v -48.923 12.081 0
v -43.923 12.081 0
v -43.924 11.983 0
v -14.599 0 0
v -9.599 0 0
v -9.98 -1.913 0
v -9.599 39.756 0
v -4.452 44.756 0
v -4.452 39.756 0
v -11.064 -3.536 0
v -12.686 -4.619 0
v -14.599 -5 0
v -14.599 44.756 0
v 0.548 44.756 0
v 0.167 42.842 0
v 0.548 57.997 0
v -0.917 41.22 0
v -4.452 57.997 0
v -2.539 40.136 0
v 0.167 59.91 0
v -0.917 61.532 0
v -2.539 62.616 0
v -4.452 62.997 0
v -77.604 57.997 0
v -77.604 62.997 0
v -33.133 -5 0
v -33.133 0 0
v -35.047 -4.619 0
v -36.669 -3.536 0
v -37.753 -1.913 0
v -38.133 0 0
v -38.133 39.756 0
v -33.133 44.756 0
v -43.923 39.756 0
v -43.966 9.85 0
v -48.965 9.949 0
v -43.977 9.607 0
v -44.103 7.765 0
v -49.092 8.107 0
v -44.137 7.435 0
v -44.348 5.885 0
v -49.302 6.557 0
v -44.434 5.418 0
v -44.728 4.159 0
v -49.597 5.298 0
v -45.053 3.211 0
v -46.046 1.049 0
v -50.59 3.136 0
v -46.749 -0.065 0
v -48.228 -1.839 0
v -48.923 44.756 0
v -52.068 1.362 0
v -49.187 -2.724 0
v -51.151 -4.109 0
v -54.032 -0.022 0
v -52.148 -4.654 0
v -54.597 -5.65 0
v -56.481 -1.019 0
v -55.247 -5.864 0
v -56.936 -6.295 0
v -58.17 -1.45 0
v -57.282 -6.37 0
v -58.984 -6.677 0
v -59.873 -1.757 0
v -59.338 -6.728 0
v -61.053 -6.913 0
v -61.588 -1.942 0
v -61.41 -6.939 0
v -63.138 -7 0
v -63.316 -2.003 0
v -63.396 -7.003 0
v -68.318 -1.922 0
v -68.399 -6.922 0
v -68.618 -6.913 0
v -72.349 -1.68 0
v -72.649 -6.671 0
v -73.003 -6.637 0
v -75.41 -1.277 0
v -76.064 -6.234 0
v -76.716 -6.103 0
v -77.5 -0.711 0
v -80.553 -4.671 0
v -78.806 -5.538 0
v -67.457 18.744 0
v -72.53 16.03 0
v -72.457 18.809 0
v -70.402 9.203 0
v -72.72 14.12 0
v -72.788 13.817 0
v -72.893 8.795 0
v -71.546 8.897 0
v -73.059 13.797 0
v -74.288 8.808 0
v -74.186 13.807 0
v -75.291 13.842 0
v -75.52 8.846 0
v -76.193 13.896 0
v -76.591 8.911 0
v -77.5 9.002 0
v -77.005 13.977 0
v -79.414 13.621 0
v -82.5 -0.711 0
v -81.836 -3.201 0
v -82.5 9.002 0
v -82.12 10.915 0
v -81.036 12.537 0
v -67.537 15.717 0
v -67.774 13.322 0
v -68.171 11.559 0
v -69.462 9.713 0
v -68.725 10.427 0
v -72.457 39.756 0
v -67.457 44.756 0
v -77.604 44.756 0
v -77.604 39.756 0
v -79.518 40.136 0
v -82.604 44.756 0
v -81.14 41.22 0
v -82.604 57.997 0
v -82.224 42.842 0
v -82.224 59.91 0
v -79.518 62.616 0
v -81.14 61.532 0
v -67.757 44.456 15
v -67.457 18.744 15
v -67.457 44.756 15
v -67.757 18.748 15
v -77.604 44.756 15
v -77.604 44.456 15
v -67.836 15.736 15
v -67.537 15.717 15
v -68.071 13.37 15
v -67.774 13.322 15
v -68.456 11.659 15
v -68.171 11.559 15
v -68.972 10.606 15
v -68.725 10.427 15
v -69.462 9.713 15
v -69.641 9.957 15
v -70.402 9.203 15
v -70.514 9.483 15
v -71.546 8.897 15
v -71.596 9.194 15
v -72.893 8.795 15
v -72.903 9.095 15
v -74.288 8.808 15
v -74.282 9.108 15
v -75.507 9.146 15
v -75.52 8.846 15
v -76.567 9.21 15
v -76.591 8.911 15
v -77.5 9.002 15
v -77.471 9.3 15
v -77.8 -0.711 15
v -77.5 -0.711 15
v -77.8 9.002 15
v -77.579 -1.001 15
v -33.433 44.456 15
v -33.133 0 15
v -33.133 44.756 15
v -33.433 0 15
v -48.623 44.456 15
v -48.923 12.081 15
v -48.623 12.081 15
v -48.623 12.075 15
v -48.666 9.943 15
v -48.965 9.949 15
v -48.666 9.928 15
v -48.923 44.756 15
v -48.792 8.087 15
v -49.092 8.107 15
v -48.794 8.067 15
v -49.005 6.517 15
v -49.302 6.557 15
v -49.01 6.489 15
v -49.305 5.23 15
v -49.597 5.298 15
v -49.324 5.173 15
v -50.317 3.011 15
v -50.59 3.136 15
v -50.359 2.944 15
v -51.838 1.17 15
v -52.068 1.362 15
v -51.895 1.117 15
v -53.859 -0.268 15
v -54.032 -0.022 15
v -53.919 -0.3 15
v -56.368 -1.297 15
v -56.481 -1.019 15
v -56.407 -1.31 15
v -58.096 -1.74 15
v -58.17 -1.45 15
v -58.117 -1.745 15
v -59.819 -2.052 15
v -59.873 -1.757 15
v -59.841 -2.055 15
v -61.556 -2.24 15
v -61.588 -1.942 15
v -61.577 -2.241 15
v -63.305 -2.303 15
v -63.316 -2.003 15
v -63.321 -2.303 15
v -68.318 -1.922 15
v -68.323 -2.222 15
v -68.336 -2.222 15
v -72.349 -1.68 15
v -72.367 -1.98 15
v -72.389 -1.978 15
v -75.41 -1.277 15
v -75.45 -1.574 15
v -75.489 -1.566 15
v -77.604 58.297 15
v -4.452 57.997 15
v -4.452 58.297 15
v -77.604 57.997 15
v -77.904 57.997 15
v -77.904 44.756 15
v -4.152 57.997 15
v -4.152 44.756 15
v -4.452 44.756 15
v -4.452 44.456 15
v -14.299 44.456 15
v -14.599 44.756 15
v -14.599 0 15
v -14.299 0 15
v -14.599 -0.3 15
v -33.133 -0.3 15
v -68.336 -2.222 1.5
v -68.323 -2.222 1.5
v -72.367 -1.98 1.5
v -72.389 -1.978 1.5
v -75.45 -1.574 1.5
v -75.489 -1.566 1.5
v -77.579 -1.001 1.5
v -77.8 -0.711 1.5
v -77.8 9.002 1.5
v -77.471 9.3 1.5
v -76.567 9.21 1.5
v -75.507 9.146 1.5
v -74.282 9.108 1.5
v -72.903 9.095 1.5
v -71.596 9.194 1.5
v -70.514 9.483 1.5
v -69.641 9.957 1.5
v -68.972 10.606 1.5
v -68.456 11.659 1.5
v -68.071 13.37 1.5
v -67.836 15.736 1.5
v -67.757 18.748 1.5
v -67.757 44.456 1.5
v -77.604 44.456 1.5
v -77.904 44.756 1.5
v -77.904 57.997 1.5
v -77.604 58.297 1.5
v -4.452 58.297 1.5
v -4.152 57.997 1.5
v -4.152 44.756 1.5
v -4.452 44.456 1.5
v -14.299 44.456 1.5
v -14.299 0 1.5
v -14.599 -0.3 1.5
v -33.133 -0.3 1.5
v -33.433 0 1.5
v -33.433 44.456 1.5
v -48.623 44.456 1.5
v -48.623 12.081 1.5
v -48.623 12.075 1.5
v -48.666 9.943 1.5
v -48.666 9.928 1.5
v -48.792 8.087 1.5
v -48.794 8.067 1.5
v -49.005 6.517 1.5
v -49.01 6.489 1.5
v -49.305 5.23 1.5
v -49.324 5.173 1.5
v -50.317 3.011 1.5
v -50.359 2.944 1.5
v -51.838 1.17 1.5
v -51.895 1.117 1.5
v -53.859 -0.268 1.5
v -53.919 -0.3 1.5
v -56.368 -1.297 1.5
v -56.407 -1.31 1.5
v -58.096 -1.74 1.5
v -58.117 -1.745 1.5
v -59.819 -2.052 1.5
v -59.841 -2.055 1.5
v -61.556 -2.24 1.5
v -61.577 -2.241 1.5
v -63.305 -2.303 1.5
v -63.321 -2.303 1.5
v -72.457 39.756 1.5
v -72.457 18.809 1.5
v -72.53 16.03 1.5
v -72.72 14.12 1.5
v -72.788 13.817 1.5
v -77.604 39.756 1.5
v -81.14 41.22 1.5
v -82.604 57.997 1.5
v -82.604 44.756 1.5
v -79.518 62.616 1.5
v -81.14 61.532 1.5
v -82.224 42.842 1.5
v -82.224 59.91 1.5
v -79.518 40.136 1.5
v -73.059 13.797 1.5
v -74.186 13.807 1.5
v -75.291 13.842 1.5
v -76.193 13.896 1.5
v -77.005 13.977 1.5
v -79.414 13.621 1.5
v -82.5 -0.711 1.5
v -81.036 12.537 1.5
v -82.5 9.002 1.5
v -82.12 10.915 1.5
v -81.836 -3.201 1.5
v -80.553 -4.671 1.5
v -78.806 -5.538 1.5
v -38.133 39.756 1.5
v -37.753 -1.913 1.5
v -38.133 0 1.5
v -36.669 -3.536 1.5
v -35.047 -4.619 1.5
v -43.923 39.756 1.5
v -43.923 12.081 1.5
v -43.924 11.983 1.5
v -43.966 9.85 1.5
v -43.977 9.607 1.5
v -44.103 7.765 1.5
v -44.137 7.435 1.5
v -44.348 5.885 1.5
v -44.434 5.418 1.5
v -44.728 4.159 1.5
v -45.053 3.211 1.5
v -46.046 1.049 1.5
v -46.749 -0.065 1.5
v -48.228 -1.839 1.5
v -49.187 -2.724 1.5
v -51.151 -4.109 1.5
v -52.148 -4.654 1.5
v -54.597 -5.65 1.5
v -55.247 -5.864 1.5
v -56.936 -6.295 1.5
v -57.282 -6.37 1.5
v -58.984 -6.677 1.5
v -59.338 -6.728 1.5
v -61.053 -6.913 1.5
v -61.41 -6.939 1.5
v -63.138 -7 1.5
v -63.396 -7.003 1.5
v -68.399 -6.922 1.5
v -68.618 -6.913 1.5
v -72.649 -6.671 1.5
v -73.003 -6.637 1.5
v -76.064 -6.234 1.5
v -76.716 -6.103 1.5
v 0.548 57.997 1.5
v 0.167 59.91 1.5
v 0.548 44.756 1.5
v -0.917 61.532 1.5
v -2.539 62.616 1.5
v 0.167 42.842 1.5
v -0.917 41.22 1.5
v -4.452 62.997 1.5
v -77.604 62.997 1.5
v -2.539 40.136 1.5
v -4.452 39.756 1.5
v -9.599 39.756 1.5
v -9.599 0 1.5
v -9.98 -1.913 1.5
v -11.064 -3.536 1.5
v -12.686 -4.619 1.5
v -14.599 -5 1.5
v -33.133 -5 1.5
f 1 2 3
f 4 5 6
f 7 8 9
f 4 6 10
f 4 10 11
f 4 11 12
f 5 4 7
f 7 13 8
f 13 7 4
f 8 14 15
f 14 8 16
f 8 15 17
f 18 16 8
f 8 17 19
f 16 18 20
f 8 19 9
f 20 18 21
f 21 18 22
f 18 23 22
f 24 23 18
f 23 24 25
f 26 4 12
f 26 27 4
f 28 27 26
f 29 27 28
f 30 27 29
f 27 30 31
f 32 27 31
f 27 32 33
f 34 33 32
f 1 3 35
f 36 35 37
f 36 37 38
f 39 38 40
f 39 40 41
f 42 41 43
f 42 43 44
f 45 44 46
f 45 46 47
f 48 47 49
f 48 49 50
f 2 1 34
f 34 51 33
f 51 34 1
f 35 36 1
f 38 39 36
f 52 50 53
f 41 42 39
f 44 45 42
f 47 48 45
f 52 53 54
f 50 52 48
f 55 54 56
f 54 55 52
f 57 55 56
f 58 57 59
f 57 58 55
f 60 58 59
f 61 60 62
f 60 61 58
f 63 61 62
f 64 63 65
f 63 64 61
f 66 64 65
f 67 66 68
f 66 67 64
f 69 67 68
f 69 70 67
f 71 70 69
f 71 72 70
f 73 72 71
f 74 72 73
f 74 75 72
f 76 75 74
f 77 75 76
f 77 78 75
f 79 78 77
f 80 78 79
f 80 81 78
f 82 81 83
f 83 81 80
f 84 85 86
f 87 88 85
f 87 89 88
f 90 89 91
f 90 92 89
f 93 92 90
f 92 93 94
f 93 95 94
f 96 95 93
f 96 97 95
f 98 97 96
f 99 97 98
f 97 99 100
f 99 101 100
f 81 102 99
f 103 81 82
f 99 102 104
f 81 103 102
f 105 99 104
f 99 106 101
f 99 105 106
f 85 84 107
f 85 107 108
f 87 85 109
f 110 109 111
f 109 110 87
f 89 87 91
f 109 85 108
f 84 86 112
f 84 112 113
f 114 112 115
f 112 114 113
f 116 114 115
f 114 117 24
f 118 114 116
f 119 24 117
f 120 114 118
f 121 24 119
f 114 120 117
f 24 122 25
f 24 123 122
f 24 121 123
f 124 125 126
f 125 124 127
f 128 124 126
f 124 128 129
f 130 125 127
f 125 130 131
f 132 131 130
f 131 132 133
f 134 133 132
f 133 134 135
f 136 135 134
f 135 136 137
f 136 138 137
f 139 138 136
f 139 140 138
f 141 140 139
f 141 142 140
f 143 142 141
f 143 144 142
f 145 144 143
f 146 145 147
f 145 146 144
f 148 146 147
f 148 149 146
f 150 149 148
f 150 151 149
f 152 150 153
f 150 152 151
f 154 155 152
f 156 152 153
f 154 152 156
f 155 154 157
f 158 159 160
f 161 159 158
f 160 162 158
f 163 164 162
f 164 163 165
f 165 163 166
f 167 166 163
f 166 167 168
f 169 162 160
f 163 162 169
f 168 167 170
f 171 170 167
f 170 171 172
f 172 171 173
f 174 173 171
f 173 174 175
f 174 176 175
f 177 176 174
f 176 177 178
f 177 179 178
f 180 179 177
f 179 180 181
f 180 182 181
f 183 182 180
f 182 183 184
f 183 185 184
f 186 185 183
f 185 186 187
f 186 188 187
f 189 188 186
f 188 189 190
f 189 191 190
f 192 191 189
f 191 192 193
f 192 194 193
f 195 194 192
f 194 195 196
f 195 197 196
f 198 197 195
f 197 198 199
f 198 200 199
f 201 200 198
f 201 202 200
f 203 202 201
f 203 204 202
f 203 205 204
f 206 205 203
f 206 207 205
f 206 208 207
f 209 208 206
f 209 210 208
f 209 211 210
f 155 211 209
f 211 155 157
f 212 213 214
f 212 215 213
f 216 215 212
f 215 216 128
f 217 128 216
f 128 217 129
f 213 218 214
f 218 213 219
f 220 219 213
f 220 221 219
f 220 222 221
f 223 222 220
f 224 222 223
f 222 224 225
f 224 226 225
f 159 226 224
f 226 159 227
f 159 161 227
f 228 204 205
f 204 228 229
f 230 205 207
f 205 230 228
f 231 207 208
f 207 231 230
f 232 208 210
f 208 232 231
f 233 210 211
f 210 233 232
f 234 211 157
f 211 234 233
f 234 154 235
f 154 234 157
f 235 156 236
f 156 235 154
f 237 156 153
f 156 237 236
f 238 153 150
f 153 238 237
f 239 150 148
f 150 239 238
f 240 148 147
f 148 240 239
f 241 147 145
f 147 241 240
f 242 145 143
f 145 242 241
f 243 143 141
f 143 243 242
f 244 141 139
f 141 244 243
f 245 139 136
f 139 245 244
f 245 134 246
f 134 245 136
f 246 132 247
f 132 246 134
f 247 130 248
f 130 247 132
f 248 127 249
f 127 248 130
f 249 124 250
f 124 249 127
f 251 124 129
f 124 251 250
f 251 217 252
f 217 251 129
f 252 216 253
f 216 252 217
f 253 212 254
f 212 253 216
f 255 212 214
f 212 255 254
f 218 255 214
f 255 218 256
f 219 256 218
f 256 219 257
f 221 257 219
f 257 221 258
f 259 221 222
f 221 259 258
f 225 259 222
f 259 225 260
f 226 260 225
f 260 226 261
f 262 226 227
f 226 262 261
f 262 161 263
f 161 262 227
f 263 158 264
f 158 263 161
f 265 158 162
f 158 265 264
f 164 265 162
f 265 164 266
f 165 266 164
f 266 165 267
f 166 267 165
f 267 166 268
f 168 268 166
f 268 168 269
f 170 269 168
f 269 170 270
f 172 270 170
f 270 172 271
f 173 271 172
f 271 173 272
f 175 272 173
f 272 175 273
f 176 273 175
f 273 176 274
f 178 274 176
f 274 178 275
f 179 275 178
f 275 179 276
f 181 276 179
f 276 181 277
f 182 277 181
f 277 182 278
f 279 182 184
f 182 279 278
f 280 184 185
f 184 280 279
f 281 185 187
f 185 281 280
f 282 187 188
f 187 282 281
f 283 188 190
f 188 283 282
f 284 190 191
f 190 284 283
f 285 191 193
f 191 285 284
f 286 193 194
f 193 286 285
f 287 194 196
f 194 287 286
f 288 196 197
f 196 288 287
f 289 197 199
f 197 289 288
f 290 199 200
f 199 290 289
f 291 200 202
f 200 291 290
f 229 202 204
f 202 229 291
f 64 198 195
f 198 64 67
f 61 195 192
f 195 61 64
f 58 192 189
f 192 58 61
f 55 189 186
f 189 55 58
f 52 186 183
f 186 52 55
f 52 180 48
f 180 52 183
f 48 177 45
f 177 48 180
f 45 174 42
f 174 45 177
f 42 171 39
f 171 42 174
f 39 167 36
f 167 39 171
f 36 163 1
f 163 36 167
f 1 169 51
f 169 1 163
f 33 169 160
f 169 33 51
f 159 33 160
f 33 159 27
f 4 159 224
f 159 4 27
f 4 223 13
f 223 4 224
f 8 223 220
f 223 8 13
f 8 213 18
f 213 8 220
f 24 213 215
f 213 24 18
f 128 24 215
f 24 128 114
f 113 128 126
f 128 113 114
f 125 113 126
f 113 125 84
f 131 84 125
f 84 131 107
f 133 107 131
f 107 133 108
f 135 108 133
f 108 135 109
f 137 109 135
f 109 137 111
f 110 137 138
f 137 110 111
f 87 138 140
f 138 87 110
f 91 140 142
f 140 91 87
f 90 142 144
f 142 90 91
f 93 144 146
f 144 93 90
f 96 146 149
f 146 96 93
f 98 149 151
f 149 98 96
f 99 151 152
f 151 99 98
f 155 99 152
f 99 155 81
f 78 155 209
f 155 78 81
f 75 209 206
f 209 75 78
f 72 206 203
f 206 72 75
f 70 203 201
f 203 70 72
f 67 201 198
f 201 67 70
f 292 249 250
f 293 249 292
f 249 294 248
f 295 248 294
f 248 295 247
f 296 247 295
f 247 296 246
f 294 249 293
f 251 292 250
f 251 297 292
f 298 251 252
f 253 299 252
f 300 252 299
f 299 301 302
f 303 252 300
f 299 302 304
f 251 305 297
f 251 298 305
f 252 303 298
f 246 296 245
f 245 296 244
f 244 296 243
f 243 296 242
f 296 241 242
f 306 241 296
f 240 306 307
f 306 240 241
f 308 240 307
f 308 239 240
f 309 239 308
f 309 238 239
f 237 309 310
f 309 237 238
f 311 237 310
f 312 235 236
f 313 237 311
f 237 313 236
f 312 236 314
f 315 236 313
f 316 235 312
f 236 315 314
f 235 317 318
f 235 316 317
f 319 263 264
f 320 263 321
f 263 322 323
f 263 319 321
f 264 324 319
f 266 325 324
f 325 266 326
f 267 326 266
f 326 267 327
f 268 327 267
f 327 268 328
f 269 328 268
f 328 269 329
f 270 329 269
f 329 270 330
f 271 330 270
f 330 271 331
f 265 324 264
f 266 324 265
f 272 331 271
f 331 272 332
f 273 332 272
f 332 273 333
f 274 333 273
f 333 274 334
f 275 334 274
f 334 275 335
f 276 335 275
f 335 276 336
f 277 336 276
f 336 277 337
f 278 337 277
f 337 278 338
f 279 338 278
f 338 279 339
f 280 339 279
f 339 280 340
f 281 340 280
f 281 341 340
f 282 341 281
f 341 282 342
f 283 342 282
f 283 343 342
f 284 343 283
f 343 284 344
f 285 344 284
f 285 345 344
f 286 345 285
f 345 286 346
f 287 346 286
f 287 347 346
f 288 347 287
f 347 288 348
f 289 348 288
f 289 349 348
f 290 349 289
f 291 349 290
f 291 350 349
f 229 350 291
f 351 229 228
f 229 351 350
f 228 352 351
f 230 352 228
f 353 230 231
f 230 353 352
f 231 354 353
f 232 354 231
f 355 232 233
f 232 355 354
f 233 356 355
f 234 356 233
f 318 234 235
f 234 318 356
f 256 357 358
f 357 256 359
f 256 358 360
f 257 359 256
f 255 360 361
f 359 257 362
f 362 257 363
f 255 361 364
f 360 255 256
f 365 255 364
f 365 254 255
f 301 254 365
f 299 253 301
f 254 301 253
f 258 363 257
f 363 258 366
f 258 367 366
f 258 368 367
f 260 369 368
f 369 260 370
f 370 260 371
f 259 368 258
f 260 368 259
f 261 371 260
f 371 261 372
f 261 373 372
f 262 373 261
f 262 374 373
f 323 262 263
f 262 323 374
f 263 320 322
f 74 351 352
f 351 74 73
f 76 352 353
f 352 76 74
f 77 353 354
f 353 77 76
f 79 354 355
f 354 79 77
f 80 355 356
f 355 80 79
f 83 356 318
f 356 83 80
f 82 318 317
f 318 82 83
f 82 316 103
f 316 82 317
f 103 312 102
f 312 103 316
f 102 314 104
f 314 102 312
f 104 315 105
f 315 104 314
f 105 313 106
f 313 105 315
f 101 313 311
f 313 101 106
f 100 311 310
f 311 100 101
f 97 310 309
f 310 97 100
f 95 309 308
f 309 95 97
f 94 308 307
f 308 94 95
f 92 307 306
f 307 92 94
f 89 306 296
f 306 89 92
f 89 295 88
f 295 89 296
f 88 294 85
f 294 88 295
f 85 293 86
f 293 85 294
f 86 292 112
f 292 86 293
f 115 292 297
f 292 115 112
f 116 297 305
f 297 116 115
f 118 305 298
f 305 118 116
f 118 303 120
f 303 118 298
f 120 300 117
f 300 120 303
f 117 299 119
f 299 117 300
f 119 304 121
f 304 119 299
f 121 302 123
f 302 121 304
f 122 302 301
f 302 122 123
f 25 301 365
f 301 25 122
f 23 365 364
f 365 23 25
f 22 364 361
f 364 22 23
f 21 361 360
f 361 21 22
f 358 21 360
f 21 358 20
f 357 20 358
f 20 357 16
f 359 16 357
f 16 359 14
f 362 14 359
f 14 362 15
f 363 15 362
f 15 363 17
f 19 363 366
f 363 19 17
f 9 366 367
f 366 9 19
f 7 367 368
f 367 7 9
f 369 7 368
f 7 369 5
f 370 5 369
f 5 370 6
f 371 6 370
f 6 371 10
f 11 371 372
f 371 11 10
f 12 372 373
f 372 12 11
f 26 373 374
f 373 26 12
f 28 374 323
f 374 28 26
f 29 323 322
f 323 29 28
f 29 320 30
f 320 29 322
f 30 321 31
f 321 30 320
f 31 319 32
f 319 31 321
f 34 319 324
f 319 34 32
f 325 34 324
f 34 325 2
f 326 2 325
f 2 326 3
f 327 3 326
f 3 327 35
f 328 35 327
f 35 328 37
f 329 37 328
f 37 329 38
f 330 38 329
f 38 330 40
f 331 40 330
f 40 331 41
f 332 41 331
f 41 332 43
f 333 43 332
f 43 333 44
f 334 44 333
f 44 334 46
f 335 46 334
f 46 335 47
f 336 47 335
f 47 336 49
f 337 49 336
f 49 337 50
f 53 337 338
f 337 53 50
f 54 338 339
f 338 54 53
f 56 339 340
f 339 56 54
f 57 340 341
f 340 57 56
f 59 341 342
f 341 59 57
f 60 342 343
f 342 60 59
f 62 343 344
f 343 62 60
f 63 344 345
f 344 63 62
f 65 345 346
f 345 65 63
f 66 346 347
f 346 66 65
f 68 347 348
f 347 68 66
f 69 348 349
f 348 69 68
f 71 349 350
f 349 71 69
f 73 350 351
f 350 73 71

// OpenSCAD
echo ("Copyright 2017 Nevit Dilmen");
echo ("Creative Commons Attribution Share Alike");

Letter = "π";
Extrude = 15;
Size = 60;
mirror ([1,0,0]) {
linear_extrude (Extrude){
difference () {
offset (0.3)
resize([0,Size,0], auto=true) 
text (Letter, font=":style=bold");
resize([0,Size,0], auto=true) 
text (Letter, font=":style=bold");
}}

linear_extrude (1.5){
difference () {
offset (5)
resize([0,Size,0], auto=true) 
text (Letter, font=":style=bold");
resize([0,Size,0], auto=true) 
text (Letter, font=":style=bold");
}
}
}
